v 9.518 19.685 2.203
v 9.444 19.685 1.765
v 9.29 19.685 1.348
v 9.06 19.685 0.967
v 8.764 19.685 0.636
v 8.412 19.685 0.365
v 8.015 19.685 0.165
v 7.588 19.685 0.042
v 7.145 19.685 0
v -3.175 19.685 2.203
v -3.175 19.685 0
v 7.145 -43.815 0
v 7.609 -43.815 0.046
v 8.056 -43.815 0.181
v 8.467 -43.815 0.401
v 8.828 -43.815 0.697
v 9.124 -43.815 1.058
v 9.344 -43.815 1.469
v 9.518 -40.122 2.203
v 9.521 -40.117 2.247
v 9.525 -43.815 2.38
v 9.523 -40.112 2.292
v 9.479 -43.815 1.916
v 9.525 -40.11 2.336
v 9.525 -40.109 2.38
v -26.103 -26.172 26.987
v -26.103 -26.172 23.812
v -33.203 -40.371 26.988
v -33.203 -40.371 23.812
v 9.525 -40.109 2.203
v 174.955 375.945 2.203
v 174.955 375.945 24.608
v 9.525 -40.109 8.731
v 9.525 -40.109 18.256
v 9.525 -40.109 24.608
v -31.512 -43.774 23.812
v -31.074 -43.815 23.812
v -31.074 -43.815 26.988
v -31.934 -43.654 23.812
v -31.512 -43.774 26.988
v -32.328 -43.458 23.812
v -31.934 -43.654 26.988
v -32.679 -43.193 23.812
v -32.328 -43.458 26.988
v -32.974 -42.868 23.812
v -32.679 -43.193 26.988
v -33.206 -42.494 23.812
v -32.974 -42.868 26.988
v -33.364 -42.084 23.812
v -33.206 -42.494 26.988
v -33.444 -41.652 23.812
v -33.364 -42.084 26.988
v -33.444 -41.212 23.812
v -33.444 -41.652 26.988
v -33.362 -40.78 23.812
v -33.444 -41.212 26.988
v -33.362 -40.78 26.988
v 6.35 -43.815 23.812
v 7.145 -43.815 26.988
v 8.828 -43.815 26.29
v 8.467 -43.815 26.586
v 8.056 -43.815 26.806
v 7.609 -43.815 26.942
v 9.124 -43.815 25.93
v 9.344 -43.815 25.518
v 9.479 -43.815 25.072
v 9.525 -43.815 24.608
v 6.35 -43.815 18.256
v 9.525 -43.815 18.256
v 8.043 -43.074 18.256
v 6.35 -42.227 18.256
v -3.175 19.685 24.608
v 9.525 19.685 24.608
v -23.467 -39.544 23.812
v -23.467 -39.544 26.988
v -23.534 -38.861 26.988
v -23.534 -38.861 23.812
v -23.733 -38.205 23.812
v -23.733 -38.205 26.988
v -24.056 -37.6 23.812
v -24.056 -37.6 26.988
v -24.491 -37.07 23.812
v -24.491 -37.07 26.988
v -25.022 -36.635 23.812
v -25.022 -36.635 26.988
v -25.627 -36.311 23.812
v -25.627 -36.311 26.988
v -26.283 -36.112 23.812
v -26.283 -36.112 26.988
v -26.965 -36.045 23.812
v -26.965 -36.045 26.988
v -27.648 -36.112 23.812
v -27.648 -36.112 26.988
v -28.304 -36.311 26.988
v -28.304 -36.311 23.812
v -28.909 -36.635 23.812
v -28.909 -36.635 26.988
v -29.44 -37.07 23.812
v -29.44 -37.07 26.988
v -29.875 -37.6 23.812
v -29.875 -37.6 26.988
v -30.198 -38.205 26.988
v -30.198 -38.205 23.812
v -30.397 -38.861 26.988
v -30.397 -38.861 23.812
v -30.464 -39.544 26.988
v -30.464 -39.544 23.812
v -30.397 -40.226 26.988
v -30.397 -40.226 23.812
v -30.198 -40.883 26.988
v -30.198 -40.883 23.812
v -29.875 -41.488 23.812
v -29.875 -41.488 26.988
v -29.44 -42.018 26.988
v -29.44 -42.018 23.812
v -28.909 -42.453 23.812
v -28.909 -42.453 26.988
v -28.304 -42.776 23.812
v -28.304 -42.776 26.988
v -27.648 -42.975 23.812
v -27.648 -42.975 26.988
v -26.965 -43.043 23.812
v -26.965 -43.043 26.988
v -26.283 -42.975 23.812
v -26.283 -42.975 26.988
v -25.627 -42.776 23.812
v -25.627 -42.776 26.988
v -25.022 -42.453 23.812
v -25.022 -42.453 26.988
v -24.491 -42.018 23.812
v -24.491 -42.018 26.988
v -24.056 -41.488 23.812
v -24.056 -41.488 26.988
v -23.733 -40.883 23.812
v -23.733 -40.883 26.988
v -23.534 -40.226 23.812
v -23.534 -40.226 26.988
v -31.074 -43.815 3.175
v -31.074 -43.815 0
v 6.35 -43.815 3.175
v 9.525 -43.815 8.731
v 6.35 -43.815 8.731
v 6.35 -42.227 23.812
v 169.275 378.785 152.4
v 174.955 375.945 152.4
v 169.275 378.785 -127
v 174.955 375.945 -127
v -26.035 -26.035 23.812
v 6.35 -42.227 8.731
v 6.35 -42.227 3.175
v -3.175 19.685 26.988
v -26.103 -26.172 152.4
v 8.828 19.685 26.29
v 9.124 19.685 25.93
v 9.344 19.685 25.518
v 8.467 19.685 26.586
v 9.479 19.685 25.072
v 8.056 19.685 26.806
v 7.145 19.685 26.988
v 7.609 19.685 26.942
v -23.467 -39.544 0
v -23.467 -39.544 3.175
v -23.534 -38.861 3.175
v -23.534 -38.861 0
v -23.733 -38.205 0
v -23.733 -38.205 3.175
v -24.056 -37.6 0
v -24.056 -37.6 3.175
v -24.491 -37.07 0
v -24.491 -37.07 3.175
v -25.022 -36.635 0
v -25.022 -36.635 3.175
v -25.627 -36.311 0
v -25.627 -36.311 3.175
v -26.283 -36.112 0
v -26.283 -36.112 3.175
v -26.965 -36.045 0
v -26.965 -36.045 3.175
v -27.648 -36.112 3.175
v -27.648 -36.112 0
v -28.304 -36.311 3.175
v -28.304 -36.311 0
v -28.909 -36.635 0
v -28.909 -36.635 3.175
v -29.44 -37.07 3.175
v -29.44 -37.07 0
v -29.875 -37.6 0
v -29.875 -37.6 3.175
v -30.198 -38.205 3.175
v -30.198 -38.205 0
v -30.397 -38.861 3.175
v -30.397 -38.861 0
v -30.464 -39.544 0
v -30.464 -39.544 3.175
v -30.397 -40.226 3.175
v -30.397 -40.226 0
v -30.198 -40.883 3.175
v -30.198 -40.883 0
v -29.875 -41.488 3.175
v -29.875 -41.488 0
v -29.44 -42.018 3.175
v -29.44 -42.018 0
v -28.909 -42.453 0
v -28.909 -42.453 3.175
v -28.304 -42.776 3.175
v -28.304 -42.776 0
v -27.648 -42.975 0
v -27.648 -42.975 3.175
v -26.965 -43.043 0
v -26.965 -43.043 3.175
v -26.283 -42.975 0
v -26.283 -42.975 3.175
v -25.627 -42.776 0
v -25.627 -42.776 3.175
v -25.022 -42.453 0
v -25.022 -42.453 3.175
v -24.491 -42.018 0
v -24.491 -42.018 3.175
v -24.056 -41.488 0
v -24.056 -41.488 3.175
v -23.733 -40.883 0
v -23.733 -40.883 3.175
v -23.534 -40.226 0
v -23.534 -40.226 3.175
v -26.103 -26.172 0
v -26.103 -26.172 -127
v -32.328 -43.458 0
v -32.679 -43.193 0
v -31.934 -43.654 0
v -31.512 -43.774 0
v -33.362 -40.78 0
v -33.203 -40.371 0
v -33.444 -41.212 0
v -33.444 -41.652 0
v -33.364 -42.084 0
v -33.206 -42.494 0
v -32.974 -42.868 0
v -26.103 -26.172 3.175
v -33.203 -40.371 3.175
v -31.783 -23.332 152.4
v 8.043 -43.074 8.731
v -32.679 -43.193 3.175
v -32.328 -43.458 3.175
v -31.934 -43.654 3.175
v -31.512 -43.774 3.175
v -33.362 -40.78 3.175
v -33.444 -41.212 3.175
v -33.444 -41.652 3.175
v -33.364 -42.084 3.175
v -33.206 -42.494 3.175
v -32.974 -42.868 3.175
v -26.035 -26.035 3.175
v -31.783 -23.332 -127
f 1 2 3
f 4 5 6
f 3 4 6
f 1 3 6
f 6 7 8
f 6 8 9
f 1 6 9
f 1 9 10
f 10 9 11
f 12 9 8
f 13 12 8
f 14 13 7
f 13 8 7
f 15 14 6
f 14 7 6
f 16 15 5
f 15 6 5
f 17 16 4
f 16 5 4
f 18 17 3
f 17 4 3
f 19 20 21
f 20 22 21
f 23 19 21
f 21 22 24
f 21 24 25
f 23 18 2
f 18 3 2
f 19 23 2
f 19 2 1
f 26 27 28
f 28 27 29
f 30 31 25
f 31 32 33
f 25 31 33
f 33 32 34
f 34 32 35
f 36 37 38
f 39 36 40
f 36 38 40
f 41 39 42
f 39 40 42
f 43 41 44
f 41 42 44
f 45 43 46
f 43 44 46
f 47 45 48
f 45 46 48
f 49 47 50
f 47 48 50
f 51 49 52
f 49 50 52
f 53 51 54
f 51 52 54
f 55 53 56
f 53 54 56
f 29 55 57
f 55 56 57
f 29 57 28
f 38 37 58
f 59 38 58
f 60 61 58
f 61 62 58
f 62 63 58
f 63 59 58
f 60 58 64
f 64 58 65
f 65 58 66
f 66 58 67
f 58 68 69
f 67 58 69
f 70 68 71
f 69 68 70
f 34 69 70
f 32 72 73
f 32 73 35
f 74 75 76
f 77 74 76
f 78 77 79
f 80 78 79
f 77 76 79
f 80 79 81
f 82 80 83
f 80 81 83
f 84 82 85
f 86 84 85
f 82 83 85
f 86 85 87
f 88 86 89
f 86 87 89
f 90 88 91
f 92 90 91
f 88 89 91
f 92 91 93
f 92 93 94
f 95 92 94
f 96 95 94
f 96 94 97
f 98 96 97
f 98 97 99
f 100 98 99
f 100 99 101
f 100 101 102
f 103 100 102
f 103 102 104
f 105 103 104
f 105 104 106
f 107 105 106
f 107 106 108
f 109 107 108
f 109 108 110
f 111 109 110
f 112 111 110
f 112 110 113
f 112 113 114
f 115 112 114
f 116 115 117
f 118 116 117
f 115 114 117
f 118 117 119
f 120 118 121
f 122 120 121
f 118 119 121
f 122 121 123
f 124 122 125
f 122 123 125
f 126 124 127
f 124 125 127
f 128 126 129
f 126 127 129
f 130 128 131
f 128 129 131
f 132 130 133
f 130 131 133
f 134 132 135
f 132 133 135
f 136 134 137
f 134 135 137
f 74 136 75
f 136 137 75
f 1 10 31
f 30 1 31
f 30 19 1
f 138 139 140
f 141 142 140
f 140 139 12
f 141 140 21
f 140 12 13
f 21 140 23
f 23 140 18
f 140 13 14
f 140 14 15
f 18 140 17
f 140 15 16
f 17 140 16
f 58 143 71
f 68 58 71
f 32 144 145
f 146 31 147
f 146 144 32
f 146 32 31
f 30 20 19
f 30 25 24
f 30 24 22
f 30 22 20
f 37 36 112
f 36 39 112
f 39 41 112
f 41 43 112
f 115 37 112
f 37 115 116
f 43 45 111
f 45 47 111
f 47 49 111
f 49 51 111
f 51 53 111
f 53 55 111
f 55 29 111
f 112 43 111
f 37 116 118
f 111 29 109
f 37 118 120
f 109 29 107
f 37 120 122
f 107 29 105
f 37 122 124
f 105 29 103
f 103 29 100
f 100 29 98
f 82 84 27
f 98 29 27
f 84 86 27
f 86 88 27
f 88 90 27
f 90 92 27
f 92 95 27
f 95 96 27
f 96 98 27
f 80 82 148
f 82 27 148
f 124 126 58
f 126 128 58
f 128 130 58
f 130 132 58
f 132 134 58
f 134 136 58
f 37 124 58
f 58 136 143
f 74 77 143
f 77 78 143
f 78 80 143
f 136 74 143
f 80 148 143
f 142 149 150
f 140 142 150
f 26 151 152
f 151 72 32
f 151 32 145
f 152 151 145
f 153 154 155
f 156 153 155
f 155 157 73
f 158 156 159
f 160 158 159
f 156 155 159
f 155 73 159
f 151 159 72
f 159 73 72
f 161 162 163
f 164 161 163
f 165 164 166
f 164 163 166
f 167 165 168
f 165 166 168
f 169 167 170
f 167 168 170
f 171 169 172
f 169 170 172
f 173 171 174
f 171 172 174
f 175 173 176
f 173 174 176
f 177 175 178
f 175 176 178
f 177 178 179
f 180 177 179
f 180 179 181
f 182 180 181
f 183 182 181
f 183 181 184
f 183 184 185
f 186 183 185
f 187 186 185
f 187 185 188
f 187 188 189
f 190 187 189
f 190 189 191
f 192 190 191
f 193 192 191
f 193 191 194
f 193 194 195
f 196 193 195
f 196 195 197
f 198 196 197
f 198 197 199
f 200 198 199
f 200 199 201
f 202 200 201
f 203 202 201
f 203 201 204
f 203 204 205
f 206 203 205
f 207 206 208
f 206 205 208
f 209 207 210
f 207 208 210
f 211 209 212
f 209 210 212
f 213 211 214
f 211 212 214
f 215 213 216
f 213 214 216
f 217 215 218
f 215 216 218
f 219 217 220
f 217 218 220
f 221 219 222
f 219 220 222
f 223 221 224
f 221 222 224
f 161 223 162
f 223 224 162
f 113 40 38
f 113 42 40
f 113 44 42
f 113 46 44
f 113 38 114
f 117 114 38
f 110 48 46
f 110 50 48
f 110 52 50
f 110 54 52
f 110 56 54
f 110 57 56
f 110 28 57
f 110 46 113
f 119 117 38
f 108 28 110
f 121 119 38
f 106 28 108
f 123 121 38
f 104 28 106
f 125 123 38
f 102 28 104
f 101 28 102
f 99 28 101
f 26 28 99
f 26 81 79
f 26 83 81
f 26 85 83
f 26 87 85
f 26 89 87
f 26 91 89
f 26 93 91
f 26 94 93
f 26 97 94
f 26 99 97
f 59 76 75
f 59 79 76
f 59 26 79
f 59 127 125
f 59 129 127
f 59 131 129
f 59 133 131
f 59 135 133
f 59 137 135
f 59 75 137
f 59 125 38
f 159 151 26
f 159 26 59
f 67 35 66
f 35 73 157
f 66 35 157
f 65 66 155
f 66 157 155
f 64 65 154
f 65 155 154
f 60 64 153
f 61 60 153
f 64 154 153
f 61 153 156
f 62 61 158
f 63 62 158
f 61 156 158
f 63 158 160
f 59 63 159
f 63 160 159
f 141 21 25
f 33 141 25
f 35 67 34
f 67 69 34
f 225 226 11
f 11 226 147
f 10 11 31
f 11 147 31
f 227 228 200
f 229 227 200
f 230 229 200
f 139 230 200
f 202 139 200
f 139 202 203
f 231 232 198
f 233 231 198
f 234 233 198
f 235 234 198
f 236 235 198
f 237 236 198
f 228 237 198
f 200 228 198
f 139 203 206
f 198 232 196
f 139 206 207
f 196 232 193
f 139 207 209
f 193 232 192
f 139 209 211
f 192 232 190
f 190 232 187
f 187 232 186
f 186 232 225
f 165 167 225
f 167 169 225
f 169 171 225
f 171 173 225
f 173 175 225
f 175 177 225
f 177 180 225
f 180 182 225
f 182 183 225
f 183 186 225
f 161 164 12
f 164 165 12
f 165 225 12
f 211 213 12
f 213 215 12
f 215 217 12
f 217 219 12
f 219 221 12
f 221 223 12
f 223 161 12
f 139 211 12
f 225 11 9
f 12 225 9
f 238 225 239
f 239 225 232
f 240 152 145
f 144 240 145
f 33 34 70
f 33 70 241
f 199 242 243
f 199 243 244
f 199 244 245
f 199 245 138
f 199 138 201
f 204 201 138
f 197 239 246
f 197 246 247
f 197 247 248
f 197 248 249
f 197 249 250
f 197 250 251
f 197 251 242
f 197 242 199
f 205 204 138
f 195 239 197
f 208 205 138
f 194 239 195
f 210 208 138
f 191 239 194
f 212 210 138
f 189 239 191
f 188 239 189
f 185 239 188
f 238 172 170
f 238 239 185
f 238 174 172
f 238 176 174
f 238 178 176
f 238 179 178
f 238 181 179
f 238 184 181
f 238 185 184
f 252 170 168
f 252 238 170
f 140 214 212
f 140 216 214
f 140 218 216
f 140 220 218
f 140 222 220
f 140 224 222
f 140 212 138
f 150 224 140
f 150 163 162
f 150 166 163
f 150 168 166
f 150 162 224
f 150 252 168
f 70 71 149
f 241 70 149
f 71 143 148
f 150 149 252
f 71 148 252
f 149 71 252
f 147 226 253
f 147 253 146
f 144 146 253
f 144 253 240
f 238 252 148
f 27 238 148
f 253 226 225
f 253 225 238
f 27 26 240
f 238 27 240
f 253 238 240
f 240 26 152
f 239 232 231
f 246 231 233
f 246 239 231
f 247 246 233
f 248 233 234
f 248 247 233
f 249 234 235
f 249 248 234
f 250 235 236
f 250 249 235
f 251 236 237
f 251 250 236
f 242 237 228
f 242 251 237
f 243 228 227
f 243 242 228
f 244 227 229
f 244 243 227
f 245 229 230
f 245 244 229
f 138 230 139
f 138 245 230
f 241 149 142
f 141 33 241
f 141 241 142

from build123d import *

# Parameters (mm, degrees)
BOSS_EXTRUDE1_DEPTH = 26.9875
SKETCH2_W           = 41.275
SKETCH2_H           = 20.6375
CUT_EXTRUDE1_DEPTH  = 64.5
SKETCH3_R           = 3.49885
CUT_EXTRUDE2_DEPTH  = 27.9875
FILLET1_R           = 2.38
FILLET2_R           = 2.38
SKETCH5_R           = 3.96875
CUT_EXTRUDE3_DEPTH  = 43.979079107
CUT_EXTRUDE4_DEPTH  = 43.979079107
SKETCH7_W           = 279.4
SKETCH7_H           = 449.58
BOSS_EXTRUDE2_DEPTH = 6.35
SKETCH11_W          = 22.404322508
SKETCH11_H          = 449.427276574
BOSS_EXTRUDE3_DEPTH = 38.1
CUT_EXTRUDE6_DEPTH  = 152.6075


with BuildPart() as part:
    # Sketch1 → Boss-Extrude1 (new body)
    with BuildSketch(Plane.XY):
        Polygon((-3.175, 19.685), (-34.925, -43.815), (9.525, -43.815), (9.525, 19.685), align=None)
    extrude(amount=BOSS_EXTRUDE1_DEPTH)

    # Sketch2 → Cut-Extrude1 (cut, through all)
    with BuildSketch(Plane(origin=(0, 19.685, 0), x_dir=(1, 0, 0), z_dir=(0, 1, 0))):
        with Locations((-14.2875, -13.49375)):
            Rectangle(SKETCH2_W, SKETCH2_H)
    extrude(amount=-CUT_EXTRUDE1_DEPTH, mode=Mode.SUBTRACT)

    # Sketch3 → Cut-Extrude2 (cut, through all)
    with BuildSketch(Plane.XY.offset(26.9875)):
        with Locations((-26.965492708, -39.543722561)):
            Circle(SKETCH3_R)
    extrude(amount=-CUT_EXTRUDE2_DEPTH, mode=Mode.SUBTRACT)

    # Fillet1
    fillet1_edges = [part.edges().sort_by_distance(p)[0] for p in [
        (9.525, -12.065, 26.9875),
        (9.525, -12.065, 0),
    ]]
    fillet(fillet1_edges, radius=FILLET1_R)

    # Fillet2
    fillet2_edges = [part.edges().sort_by_distance(p)[0] for p in [
        (-34.925, -43.815, 1.5875),
        (-34.925, -43.815, 25.4),
    ]]
    fillet(fillet2_edges, radius=FILLET2_R)

    # Sketch5 → Cut-Extrude3 (cut, through all)
    with BuildSketch(Plane(origin=(9.525, 0, 0), x_dir=(0, 0, -1), z_dir=(1, 0, 0))):
        with Locations((-12.488615689, 8.5725)):
            Circle(SKETCH5_R)
    extrude(amount=-CUT_EXTRUDE3_DEPTH, mode=Mode.SUBTRACT)

    # Sketch6 → Cut-Extrude4 (cut, through all)
    with BuildSketch(Plane(origin=(9.525, 0, 0), x_dir=(0, 0, -1), z_dir=(1, 0, 0))):
        with BuildLine():
            Line((-8.73125, -43.815), (-18.25625, -43.815))
            Line((-18.25625, -43.815), (-18.25625, -32.7025))
            ThreePointArc((-18.25625, -32.7025), (-13.49375, -27.94), (-8.73125, -32.7025))
            Line((-8.73125, -32.7025), (-8.73125, -43.815))
        make_face()
    extrude(amount=-CUT_EXTRUDE4_DEPTH, mode=Mode.SUBTRACT)

    # Sketch7 → Boss-Extrude2 (add)
    with BuildSketch(Plane(origin=(-10.414, 5.207, 0), x_dir=(0, 0, 1), z_dir=(-0.894427191, 0.447213595, 0))):
        with Locations((12.7, 189.707658697)):
            Rectangle(SKETCH7_W, SKETCH7_H)
    extrude(amount=BOSS_EXTRUDE2_DEPTH)

    # Sketch11 → Boss-Extrude3 (add)
    with BuildSketch(Plane(origin=(-10.414, 5.207, 0), x_dir=(0, 0, -1), z_dir=(0.894427191, -0.447213595, 0))):
        with Locations((-13.405338746, 189.78402041)):
            Rectangle(SKETCH11_W, SKETCH11_H)
    extrude(amount=BOSS_EXTRUDE3_DEPTH)

    # Sketch13 → Cut-Extrude6 (cut, through all)
    with BuildSketch(Plane.XY.offset(24.6075)):
        Polygon((174.954988272, 375.944976544), (9.525, -40.109189943), (209.032664249, 358.906138556), align=None)
    extrude(amount=-CUT_EXTRUDE6_DEPTH, mode=Mode.SUBTRACT)


solid = part.part
